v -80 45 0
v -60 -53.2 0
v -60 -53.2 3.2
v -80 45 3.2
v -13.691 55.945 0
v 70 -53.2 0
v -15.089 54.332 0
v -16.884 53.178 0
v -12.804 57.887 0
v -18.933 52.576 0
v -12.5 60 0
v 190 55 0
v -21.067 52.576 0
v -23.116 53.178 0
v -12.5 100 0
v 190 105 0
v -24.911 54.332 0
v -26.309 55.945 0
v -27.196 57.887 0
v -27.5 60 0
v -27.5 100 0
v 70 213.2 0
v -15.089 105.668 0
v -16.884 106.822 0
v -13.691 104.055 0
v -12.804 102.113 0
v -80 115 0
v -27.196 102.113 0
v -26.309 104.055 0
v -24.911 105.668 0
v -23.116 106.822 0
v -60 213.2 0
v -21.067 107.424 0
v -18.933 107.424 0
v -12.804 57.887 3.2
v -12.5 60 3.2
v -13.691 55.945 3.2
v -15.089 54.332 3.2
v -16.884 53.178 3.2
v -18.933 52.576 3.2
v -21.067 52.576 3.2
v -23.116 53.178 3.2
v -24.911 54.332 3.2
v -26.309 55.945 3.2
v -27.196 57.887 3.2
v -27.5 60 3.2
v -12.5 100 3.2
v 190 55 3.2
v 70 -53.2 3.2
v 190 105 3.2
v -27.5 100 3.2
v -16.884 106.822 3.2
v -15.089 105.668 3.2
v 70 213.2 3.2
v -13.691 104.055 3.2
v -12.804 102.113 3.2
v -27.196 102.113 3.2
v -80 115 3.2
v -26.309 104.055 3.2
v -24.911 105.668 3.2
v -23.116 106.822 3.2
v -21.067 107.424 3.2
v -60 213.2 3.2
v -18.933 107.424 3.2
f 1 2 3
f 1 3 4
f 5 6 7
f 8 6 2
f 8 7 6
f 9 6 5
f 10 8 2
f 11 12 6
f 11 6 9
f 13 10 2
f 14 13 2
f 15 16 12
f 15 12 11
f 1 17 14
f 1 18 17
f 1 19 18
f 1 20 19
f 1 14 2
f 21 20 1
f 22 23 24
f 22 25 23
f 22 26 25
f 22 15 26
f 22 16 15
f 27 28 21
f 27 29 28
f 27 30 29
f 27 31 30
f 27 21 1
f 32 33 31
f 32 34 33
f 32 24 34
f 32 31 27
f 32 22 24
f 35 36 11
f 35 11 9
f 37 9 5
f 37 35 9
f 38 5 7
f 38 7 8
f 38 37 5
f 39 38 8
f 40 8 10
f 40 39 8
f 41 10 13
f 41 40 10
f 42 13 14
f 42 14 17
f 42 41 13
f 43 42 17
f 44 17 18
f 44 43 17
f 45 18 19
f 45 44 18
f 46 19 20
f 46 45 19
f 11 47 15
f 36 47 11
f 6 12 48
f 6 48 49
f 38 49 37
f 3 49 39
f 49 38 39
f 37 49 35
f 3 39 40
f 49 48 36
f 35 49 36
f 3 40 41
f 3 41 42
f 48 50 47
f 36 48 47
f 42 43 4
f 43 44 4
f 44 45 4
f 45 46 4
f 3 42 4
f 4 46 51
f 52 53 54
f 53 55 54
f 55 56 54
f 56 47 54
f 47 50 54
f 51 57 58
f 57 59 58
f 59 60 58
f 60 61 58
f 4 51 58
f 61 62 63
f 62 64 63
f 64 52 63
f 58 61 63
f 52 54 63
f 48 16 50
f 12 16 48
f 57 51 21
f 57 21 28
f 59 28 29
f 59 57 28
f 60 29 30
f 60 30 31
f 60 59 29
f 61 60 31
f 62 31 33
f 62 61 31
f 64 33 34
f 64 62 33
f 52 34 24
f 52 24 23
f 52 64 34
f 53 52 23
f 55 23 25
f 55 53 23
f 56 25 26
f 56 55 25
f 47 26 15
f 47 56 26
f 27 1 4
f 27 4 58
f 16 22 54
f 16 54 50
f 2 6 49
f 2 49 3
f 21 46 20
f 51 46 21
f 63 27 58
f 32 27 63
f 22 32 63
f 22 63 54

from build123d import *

# Parameters (mm, degrees)
EXTRUDE_1_DEPTH     = 3.2
CUT_EXTRUDE_1_DEPTH = 3.2


with BuildPart() as part:
    # Эскиз1 → Бобышка-Вытянуть1 (new body)
    with BuildSketch(Plane.XY):
        Polygon((70, -53.2), (-60, -53.2), (-80, 45), (-80, 115), (-60, 213.2), (70, 213.2), (190, 105), (190, 55), align=None)
    extrude(amount=EXTRUDE_1_DEPTH)

    # Эскиз2 → Вырез-Вытянуть1 (cut)
    with BuildSketch(Plane.XY.offset(3.2)):
        with BuildLine():
            Line((-27.5, 60), (-27.5, 100))
            ThreePointArc((-27.5, 100), (-20, 107.5), (-12.5, 100))
            Line((-12.5, 100), (-12.5, 60))
            ThreePointArc((-12.5, 60), (-20, 52.5), (-27.5, 60))
        make_face()
    extrude(amount=-CUT_EXTRUDE_1_DEPTH, mode=Mode.SUBTRACT)


solid = part.part
